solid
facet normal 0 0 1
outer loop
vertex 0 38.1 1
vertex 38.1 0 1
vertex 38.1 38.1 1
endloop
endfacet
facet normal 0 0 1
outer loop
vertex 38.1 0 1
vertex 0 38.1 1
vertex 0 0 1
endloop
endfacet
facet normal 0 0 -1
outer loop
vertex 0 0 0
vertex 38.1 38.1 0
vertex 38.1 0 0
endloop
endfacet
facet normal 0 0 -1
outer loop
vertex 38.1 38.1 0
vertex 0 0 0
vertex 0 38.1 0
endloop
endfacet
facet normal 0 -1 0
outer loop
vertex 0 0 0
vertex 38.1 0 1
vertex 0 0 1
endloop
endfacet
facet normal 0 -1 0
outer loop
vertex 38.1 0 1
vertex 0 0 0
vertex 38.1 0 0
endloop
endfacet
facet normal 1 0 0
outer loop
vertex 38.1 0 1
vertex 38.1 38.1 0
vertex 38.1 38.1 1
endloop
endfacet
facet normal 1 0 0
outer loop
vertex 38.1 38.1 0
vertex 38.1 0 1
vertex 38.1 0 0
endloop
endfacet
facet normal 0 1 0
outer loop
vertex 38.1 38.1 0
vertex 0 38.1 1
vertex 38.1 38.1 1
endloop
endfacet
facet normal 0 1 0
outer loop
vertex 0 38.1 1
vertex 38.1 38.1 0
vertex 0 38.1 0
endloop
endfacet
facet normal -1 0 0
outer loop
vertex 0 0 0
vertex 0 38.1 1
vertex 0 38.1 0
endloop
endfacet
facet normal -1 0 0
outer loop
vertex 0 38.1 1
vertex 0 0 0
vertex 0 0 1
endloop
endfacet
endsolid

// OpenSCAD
$fn = 150;

cube(size = [38.099999999999994, 38.099999999999994, 1]);
